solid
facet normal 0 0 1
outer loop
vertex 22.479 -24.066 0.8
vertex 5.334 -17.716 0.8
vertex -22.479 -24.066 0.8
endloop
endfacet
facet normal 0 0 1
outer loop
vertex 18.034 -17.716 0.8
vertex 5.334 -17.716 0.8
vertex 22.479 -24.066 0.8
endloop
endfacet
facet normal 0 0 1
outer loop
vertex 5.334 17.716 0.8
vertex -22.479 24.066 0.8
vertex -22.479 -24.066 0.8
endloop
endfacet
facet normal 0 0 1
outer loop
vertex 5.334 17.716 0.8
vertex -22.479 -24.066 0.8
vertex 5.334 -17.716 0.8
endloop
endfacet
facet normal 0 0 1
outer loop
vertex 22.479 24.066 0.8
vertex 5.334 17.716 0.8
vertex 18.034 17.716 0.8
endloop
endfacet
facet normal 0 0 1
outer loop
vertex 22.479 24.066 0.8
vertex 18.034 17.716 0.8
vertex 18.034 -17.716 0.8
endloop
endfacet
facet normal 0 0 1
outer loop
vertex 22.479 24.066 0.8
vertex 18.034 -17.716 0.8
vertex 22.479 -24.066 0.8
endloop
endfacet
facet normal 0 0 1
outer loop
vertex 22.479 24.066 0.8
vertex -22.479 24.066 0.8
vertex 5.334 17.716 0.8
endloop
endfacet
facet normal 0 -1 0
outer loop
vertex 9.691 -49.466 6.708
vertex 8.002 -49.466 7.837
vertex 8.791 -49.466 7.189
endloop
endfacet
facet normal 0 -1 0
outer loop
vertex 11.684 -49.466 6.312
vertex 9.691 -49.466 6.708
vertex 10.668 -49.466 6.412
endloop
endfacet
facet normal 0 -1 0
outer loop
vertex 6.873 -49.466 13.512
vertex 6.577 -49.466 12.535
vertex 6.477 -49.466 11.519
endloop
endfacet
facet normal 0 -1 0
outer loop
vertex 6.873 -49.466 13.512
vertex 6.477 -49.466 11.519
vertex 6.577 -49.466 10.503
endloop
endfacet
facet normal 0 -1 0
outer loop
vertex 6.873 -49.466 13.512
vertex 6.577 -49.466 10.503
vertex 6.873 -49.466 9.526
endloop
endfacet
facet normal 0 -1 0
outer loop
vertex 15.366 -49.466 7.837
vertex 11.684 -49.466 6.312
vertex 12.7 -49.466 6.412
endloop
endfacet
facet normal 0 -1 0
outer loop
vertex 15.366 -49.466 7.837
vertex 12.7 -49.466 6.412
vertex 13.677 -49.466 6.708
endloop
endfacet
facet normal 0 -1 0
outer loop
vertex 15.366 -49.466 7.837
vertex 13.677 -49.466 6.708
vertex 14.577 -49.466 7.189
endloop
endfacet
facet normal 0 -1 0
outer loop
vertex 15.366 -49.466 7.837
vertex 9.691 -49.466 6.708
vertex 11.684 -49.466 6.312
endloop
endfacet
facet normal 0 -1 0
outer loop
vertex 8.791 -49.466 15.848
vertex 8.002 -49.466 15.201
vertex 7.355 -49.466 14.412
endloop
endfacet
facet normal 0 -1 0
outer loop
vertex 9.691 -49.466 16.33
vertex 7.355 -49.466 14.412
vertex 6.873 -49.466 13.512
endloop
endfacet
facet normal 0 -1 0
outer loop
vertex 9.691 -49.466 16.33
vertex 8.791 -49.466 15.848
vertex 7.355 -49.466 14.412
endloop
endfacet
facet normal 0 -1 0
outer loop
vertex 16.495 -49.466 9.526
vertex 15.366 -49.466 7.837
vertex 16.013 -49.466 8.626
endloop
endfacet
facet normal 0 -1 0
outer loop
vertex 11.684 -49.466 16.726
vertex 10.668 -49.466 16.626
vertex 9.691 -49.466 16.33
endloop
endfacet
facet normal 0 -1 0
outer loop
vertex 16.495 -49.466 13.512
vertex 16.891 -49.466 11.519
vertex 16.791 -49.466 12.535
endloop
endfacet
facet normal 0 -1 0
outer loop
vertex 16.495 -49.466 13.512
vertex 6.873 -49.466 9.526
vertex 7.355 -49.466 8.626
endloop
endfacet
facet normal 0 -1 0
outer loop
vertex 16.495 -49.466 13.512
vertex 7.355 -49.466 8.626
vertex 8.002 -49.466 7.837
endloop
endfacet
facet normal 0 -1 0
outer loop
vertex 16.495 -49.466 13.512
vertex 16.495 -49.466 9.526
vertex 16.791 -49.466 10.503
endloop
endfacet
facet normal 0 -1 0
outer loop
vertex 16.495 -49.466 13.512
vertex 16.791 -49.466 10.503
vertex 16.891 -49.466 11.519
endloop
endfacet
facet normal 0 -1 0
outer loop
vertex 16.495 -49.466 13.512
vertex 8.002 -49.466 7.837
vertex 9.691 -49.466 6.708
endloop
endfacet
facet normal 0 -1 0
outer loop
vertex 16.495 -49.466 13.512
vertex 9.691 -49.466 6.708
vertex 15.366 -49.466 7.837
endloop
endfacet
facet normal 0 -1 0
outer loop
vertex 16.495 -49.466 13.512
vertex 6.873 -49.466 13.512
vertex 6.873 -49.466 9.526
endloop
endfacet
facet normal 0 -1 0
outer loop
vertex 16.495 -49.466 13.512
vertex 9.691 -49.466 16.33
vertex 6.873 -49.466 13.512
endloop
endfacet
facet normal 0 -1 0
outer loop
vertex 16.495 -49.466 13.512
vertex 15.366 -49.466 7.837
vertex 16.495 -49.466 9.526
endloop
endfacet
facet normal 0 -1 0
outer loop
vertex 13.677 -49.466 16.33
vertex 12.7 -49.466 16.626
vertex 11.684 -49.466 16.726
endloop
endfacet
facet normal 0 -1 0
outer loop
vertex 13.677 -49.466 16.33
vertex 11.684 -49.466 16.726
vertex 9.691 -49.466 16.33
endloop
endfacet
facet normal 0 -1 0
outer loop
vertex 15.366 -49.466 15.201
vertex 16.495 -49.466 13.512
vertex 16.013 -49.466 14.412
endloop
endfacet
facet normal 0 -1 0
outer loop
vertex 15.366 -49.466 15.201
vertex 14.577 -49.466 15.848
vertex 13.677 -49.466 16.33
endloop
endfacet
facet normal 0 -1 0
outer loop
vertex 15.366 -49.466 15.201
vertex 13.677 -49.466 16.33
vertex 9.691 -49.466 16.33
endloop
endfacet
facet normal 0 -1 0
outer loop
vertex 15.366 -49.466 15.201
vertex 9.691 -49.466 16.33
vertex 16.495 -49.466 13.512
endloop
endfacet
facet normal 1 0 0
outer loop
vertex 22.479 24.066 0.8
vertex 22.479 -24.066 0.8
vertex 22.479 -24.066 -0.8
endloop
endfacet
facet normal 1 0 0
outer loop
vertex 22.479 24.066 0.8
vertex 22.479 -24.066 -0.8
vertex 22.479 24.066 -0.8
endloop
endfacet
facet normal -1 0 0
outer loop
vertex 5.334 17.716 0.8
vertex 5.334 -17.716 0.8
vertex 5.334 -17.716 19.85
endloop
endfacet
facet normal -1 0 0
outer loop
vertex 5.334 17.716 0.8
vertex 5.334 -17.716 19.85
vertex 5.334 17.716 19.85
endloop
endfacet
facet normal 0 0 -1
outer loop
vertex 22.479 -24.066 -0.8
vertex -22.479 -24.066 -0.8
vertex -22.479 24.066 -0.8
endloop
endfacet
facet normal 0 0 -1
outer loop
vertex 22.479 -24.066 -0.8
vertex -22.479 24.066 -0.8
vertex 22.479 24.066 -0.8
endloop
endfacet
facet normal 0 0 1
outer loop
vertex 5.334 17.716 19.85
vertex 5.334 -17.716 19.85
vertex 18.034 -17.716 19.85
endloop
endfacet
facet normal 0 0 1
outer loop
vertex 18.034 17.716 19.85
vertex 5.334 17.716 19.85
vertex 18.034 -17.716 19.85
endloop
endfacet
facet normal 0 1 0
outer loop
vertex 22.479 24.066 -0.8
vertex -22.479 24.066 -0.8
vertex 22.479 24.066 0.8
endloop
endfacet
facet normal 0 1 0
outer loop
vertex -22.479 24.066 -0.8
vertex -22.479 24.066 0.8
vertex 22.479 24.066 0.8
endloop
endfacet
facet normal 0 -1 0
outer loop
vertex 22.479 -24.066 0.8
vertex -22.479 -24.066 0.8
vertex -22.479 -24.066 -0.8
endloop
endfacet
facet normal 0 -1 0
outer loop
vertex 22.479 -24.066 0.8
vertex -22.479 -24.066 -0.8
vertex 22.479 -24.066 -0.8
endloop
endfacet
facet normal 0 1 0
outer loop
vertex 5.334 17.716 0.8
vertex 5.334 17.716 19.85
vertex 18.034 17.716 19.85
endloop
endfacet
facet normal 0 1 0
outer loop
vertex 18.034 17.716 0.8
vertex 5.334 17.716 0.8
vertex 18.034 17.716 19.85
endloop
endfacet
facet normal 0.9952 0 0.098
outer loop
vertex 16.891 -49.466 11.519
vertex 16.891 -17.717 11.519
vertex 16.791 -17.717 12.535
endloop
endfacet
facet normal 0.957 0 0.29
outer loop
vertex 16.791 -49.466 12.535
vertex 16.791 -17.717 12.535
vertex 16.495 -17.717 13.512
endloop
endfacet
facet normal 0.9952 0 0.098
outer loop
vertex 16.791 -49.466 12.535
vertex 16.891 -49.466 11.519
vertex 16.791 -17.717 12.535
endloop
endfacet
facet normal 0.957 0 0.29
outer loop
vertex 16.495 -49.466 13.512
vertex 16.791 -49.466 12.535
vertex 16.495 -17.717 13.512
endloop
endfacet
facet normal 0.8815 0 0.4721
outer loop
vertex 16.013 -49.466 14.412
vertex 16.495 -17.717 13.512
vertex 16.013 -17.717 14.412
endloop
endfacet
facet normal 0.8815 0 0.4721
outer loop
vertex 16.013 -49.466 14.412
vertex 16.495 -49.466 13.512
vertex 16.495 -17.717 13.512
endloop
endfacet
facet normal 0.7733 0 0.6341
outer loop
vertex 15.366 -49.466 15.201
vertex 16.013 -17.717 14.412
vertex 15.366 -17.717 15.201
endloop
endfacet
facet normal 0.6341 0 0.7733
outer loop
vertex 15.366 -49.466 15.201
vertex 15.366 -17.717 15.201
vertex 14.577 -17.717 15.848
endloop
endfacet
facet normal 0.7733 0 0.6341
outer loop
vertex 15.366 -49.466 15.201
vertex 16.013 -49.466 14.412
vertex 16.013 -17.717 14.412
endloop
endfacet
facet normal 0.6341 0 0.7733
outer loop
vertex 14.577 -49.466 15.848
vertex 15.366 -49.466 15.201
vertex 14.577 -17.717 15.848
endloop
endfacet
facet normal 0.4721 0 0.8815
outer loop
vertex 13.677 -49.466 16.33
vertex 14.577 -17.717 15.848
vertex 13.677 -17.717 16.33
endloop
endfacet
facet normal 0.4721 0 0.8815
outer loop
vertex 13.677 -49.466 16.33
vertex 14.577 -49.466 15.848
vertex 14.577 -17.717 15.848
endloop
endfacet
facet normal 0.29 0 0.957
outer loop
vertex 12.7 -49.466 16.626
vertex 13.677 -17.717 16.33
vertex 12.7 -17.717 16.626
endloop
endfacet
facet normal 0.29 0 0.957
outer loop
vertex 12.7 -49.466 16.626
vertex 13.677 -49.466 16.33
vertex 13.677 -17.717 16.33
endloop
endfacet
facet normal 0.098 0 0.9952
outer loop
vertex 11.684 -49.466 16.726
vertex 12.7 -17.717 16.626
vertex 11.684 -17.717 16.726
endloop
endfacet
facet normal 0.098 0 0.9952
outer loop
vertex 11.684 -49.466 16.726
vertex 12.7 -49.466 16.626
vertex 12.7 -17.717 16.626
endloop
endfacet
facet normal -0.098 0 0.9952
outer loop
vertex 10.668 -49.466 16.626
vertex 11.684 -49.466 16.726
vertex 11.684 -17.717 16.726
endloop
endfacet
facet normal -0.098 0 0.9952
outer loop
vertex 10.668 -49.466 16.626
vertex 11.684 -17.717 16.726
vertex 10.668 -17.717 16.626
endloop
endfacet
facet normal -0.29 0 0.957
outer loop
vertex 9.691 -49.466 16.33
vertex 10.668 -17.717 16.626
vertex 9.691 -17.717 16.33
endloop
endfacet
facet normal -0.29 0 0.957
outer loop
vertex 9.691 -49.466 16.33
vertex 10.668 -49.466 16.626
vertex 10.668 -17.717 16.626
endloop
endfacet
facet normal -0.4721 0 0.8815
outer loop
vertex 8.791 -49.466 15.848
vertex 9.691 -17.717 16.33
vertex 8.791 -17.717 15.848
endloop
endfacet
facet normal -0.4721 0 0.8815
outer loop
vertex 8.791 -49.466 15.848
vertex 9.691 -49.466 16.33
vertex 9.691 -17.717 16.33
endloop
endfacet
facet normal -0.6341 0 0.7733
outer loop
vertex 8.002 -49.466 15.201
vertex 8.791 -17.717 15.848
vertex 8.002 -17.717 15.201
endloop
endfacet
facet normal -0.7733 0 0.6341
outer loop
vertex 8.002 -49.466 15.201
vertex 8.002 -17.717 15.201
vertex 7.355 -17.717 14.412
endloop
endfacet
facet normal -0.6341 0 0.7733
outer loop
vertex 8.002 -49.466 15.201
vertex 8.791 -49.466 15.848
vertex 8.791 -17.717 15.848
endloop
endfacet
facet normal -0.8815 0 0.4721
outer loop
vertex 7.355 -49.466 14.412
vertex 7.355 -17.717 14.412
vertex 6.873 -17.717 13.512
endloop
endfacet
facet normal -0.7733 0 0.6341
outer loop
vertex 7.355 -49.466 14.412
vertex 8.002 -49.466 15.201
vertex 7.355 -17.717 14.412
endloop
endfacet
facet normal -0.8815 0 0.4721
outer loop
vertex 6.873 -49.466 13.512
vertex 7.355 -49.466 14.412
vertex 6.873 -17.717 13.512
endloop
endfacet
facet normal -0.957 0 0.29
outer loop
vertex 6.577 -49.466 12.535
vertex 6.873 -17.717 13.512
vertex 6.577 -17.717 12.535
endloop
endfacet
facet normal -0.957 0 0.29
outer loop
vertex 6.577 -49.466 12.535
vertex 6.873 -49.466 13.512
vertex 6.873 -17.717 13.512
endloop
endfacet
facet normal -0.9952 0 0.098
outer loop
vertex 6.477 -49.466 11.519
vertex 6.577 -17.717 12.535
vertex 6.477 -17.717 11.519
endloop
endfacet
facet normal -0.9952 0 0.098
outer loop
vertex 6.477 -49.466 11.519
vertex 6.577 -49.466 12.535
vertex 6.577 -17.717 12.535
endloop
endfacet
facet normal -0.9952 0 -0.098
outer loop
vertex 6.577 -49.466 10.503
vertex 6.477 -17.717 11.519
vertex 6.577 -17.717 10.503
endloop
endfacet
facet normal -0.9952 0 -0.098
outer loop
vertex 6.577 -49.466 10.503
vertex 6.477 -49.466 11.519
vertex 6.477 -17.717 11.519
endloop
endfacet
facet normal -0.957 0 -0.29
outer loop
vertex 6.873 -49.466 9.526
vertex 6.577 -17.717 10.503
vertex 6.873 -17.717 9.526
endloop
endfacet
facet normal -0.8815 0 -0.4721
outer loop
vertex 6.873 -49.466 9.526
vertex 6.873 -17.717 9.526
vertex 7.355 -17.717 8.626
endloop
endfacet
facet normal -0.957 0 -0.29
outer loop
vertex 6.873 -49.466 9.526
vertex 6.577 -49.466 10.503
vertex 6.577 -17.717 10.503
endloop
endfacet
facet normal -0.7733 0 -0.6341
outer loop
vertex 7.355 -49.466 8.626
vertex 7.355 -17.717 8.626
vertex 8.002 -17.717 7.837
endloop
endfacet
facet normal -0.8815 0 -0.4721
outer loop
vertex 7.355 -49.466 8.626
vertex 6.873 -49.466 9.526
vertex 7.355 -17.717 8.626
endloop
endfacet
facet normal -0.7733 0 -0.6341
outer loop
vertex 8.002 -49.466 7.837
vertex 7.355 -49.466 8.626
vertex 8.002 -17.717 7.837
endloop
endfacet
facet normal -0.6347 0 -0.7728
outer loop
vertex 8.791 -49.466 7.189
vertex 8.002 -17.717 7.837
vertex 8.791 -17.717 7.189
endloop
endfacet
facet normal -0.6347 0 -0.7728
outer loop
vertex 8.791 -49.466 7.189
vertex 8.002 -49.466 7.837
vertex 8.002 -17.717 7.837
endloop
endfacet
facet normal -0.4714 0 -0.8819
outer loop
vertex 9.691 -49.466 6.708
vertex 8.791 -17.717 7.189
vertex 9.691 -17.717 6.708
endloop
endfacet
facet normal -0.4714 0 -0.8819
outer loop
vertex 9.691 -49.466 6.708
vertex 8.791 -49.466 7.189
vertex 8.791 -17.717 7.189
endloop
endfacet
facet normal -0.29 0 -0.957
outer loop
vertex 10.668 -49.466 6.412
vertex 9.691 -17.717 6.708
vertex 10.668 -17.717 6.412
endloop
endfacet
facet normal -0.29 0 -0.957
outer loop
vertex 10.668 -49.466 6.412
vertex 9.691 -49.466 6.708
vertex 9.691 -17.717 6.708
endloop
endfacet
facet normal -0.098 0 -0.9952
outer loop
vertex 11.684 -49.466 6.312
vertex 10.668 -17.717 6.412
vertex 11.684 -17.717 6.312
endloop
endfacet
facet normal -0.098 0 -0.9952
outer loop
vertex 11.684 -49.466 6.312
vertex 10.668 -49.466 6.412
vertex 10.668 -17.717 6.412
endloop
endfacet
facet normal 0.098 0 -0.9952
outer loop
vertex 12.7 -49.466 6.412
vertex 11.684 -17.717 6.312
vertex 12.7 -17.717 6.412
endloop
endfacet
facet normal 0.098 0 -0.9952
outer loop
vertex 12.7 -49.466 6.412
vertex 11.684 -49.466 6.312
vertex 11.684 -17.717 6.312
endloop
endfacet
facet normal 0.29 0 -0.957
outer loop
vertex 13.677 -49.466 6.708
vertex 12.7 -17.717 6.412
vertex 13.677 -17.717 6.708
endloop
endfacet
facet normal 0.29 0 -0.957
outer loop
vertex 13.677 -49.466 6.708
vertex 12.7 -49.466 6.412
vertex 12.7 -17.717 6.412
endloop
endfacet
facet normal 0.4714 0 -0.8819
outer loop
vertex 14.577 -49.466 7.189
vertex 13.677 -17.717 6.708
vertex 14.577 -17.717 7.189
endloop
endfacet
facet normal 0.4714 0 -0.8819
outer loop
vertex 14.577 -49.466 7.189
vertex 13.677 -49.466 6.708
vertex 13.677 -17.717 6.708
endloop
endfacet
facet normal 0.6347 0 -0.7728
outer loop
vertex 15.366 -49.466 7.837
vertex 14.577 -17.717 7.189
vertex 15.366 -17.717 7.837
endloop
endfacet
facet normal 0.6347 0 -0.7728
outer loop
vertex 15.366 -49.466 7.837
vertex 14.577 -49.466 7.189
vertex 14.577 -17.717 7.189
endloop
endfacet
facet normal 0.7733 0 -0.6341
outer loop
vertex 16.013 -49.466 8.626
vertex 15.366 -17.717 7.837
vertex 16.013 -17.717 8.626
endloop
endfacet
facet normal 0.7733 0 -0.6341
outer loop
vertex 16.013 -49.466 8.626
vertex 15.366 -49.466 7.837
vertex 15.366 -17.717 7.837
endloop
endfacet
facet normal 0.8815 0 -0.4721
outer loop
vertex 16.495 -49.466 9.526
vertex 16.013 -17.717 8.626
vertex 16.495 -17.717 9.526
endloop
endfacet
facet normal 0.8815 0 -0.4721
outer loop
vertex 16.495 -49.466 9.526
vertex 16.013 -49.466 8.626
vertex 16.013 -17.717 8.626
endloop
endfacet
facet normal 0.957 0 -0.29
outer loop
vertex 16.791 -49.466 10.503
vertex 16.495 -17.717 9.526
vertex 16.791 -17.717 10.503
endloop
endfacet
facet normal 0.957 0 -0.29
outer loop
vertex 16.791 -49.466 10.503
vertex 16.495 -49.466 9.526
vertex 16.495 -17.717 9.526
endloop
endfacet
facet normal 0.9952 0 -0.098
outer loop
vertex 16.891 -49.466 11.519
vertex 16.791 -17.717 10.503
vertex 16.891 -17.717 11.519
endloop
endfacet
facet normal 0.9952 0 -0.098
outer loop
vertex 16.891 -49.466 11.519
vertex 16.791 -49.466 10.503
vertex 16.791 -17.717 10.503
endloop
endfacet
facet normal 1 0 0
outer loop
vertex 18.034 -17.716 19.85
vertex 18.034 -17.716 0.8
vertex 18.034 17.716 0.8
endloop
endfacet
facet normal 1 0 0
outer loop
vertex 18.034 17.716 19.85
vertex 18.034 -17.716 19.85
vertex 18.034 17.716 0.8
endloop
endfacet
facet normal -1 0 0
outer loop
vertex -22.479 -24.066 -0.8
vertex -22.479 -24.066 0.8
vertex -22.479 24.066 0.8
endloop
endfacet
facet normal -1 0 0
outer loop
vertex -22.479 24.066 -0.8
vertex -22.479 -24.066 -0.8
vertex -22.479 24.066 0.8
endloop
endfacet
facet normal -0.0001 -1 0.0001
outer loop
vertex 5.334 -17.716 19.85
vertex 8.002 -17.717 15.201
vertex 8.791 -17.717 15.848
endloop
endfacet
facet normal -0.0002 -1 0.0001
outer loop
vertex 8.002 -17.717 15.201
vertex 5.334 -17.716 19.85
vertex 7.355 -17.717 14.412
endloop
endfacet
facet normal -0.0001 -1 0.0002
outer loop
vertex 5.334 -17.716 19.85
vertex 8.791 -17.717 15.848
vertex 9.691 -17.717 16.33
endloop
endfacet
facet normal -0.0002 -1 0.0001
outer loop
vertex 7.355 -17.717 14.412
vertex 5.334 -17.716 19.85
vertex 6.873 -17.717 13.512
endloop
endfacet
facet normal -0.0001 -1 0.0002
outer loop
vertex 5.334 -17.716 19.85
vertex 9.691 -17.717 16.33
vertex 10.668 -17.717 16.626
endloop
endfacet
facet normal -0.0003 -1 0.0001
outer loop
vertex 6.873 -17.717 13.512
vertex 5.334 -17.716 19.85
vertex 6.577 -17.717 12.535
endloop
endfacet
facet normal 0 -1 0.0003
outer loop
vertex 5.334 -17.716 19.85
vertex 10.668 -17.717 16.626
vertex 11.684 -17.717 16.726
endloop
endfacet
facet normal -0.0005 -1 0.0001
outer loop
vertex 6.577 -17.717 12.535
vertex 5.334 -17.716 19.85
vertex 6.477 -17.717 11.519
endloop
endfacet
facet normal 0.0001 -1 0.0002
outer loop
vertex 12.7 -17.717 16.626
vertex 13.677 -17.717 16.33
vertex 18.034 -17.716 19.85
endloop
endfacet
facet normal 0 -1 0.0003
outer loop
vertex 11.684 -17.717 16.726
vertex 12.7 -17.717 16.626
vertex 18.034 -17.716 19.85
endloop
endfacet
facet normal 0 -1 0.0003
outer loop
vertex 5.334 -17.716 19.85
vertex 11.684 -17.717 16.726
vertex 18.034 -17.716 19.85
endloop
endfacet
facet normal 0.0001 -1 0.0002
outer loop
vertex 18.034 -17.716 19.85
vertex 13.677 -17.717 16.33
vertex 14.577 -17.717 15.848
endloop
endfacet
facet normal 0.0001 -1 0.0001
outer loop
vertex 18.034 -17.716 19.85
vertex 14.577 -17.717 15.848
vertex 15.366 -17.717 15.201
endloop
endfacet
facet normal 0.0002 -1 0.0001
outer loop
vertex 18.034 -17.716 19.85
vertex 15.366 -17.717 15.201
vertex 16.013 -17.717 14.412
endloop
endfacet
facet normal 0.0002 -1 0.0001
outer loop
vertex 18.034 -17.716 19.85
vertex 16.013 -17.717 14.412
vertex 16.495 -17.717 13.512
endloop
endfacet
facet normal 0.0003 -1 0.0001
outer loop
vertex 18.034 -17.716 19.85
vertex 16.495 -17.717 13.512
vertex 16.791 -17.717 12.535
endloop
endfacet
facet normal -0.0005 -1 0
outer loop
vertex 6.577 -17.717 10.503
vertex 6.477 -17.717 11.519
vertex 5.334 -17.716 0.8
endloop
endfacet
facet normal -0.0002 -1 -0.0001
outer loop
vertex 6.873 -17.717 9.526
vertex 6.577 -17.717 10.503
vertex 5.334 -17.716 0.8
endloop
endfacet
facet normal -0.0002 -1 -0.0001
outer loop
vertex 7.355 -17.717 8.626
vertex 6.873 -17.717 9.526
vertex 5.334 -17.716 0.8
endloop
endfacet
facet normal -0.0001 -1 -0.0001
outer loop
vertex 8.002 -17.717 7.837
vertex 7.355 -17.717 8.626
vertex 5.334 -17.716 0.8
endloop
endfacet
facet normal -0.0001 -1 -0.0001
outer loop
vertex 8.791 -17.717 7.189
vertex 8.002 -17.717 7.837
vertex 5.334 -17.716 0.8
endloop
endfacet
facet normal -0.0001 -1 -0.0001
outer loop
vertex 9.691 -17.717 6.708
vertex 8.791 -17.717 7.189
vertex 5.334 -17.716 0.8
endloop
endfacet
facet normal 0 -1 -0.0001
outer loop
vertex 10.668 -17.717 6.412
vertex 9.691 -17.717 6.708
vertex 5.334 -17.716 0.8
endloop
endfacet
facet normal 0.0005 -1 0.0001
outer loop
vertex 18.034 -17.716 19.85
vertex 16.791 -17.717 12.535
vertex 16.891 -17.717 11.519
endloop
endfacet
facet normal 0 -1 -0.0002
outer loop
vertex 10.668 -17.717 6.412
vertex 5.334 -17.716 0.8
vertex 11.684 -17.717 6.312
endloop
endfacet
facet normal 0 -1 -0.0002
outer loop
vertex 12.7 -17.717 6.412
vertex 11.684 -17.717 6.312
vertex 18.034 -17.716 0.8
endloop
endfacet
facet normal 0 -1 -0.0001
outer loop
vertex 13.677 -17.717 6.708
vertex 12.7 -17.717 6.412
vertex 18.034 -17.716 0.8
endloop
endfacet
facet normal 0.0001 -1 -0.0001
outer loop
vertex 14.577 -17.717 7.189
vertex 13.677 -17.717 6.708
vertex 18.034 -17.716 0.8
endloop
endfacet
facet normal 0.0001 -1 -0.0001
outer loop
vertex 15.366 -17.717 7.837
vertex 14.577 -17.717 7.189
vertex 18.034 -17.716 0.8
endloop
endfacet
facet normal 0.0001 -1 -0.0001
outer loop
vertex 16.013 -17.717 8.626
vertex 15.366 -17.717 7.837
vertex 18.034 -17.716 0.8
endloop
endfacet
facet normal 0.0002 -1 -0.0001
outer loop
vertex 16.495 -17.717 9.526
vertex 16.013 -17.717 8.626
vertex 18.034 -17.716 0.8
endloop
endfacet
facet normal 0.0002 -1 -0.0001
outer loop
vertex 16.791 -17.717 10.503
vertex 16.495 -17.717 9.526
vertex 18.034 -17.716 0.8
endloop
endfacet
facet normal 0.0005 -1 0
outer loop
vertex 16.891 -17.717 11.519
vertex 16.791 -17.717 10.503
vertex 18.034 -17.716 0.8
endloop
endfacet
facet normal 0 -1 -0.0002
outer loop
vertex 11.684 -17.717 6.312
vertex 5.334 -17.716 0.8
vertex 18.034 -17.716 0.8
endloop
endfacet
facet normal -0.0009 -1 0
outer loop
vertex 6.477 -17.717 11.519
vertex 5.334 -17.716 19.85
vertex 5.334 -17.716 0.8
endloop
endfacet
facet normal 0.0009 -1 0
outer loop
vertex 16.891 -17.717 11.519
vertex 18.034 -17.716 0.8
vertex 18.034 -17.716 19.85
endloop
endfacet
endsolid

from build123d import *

# Parameters (mm, degrees)
F0_W          = 44.958
F0_H          = 48.133
F1_DEPTH      = 0.8001
F2_R          = 5.207
F3_DEPTH      = 25.4
F3_DEPTH_BACK = 6.35
F4_W          = 12.7
F4_H          = 35.433
F5_DEPTH      = 19.05


with BuildPart() as f1:
    # F0 (on Top) → F1 (new body, symmetric)
    with BuildSketch(Plane.XY):
        Rectangle(F0_W, F0_H)
    extrude(amount=F1_DEPTH, both=True)



with BuildPart() as f3:
    # F2 (on face) → F3 (new body, two sides)
    with BuildSketch(Plane.XZ.offset(24.0665)) as f3_sk:
        with Locations((11.684, 11.5189)):
            Circle(F2_R)
    extrude(amount=F3_DEPTH)
    extrude(f3_sk.sketch, amount=-F3_DEPTH_BACK)


with BuildPart() as f1_1:
    add(f1.part)

    add(f3.part)  # F5 merges F3
    # F4 (on face) → F5 (join)
    with BuildSketch(Plane.XY.offset(0.8001)):
        with Locations((11.684, 0)):
            Rectangle(F4_W, F4_H)
    extrude(amount=F5_DEPTH)


solid = f1_1.part
